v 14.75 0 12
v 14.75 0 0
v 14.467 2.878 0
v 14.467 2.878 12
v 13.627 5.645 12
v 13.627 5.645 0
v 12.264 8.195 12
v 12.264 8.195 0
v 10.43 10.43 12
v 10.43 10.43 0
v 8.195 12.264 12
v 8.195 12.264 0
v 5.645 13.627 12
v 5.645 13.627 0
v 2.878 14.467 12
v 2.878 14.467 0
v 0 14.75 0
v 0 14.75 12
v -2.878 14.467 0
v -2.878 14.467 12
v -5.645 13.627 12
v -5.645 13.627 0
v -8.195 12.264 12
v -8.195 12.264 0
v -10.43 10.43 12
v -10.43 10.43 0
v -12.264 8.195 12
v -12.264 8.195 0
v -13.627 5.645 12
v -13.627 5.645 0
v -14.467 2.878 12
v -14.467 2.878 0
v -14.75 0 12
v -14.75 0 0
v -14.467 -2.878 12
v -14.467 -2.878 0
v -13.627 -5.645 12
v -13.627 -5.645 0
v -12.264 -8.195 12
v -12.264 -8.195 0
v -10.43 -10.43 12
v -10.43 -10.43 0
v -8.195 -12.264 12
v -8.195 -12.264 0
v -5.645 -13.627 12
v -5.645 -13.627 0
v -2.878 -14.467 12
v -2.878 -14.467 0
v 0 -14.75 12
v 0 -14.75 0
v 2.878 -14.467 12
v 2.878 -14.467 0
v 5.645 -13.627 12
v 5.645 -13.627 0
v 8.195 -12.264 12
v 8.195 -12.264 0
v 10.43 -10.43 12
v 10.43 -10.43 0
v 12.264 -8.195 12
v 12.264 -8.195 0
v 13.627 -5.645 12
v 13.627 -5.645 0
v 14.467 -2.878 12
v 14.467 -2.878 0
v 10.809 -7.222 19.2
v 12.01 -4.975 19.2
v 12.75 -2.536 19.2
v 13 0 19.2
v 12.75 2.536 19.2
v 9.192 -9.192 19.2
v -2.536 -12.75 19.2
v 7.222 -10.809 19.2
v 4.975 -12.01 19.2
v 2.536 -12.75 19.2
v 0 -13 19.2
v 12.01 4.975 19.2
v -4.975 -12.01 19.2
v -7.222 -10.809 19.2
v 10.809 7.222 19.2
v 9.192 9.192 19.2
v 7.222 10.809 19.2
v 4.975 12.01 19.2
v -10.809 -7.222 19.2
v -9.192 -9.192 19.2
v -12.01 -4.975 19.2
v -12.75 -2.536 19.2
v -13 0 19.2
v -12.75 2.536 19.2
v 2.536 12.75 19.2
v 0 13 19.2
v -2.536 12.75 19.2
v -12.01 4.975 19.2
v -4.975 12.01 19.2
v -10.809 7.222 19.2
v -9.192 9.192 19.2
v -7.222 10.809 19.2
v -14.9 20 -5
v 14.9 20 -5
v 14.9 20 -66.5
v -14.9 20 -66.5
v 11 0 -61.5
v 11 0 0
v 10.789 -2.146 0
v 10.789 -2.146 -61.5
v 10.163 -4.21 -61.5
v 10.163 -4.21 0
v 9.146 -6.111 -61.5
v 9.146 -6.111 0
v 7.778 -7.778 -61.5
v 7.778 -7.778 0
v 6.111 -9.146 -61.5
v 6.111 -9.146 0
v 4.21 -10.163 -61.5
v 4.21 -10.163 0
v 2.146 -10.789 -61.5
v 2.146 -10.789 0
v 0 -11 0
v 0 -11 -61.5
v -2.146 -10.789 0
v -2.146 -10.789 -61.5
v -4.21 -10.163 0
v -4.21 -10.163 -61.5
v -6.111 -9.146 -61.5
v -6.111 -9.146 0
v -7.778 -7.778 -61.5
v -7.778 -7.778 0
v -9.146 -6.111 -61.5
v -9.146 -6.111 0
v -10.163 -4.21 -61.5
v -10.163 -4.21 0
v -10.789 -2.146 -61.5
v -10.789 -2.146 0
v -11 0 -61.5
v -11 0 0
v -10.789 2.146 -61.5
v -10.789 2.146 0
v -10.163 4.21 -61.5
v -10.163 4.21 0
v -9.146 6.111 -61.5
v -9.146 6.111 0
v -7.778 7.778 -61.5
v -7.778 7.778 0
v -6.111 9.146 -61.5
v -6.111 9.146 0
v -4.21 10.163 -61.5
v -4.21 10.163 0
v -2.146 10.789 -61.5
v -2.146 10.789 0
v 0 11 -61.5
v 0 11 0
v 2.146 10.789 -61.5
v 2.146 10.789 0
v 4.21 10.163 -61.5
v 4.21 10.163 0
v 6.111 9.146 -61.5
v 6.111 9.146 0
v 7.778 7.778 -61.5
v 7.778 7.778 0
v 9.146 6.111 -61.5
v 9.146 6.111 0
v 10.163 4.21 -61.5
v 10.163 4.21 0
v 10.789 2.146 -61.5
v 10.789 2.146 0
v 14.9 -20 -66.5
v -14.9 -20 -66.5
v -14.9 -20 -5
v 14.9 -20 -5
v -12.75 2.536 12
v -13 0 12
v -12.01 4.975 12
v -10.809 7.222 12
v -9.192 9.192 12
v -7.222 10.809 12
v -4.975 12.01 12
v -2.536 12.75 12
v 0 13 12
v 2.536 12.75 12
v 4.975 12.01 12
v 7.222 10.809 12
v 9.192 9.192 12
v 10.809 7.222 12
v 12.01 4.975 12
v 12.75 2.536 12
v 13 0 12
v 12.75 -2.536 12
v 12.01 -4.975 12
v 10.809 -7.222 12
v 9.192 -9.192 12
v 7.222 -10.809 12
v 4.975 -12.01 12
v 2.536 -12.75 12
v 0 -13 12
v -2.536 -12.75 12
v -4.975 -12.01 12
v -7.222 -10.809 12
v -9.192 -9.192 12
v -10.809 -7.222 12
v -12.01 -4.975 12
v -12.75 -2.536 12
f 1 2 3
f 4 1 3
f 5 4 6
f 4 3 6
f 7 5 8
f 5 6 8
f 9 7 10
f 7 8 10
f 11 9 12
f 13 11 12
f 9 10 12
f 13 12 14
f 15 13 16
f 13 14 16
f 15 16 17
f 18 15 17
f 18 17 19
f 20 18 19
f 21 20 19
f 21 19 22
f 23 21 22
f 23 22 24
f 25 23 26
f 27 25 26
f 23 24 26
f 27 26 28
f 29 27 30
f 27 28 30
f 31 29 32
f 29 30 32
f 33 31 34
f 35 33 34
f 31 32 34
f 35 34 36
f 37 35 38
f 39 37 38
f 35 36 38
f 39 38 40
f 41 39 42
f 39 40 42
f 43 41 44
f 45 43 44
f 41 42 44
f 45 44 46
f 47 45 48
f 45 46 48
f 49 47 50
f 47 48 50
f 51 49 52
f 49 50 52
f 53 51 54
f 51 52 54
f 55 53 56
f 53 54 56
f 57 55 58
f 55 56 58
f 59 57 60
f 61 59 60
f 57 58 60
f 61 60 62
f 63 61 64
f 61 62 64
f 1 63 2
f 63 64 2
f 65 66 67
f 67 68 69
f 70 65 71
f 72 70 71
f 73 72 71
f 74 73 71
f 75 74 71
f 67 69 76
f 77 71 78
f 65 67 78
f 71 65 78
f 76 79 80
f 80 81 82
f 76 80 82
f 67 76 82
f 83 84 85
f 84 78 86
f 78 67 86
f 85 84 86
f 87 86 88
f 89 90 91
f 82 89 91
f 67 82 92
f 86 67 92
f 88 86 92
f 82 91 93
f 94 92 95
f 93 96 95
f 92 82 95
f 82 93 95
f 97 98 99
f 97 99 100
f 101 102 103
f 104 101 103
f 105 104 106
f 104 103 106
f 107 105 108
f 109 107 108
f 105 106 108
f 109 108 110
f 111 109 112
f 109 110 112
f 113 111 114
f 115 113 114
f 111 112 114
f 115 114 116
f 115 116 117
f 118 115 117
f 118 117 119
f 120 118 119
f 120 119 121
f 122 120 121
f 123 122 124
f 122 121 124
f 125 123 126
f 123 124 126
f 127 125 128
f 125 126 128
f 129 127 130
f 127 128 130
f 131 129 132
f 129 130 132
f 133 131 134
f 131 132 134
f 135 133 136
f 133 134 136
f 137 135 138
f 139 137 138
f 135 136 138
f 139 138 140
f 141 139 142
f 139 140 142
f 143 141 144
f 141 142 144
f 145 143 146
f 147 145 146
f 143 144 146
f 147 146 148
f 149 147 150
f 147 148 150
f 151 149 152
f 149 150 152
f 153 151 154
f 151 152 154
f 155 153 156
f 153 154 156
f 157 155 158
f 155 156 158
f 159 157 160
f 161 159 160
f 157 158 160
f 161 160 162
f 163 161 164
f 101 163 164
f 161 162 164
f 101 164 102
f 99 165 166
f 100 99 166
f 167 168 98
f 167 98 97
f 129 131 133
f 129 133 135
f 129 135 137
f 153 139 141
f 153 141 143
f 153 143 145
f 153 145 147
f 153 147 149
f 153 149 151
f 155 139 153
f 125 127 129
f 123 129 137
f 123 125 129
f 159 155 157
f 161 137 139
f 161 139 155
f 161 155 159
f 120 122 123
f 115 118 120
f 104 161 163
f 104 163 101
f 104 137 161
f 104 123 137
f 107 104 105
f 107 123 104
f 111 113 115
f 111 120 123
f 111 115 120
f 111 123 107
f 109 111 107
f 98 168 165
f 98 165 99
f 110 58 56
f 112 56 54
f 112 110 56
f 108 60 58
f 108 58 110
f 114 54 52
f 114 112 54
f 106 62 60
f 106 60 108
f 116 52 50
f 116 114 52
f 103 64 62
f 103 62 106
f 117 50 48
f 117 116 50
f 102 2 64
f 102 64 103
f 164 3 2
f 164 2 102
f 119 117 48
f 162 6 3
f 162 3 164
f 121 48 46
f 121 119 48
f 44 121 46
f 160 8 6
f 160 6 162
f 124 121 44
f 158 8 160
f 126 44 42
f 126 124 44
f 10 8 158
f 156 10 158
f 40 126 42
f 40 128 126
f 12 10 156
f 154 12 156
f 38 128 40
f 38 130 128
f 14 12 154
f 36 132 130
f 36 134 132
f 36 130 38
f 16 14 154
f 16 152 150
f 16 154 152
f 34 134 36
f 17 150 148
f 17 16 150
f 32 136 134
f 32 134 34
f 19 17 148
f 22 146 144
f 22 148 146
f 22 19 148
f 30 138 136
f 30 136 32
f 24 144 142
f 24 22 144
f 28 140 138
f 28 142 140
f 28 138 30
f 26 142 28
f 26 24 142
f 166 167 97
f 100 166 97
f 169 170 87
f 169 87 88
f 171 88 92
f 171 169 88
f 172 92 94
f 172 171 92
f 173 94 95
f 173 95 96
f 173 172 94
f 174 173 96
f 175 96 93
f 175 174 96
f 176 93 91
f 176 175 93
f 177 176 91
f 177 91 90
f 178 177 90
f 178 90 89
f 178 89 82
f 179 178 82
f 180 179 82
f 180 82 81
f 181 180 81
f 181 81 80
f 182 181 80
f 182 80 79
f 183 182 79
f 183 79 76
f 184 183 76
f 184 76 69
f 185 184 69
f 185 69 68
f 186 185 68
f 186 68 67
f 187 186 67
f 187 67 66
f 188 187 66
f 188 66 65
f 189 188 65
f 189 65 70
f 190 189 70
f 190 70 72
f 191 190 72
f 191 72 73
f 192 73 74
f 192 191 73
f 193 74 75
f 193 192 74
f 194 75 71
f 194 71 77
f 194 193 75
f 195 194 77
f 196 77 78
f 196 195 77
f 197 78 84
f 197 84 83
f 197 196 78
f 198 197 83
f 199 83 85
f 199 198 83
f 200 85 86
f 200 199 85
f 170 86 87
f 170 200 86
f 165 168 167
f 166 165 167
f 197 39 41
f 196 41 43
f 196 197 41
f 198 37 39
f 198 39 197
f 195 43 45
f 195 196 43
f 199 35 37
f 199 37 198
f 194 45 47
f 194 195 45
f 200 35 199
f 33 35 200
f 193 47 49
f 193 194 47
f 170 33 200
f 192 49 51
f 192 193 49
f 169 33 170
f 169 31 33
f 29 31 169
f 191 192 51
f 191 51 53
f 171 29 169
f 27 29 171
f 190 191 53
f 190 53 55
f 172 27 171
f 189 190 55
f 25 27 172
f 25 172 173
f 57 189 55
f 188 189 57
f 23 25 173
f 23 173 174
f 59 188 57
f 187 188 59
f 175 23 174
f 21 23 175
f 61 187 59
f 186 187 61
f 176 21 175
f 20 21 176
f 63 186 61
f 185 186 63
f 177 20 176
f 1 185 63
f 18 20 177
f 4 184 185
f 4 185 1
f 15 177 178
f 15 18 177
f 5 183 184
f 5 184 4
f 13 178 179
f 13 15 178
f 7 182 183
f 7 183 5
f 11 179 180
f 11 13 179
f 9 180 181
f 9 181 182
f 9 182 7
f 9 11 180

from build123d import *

# Parameters (mm, degrees)
SKETCH1_R           = 14.75
BOSS_EXTRUDE1_DEPTH = 12
SKETCH2_R           = 13
BOSS_EXTRUDE2_DEPTH = 19.2
SKETCH4_R           = 11
BOSS_EXTRUDE4_DEPTH = 61.5
BOSS_EXTRUDE3_START = 5
SKETCH3_W           = 29.8
SKETCH3_H           = 40
BOSS_EXTRUDE3_DEPTH = 61.5


with BuildPart() as part:
    # Sketch1 → Boss-Extrude1 (new body)
    with BuildSketch(Plane.XY):
        Circle(SKETCH1_R)
    extrude(amount=BOSS_EXTRUDE1_DEPTH)

    # Sketch2 → Boss-Extrude2 (add)
    with BuildSketch(Plane(origin=(0, 0, 0), x_dir=(-1, 0, 0), z_dir=(0, 0, -1))):
        Circle(SKETCH2_R)
    extrude(amount=-BOSS_EXTRUDE2_DEPTH)

    # Sketch4 → Boss-Extrude4 (add)
    with BuildSketch(Plane(origin=(0, 0, 0), x_dir=(-1, 0, 0), z_dir=(0, 0, -1))):
        with Locations(Location((0, 0, 0), (0, 0, 180))):
            Circle(SKETCH4_R)
    extrude(amount=BOSS_EXTRUDE4_DEPTH)


with BuildPart() as body_2:
    # Sketch3 → Boss-Extrude3 (new body)
    with BuildSketch(Plane(origin=(0, 0, 0), x_dir=(-1, 0, 0), z_dir=(0, 0, -1)).offset(BOSS_EXTRUDE3_START)):
        Rectangle(SKETCH3_W, SKETCH3_H)
    extrude(amount=BOSS_EXTRUDE3_DEPTH)


solid = Compound([part.part, body_2.part])
